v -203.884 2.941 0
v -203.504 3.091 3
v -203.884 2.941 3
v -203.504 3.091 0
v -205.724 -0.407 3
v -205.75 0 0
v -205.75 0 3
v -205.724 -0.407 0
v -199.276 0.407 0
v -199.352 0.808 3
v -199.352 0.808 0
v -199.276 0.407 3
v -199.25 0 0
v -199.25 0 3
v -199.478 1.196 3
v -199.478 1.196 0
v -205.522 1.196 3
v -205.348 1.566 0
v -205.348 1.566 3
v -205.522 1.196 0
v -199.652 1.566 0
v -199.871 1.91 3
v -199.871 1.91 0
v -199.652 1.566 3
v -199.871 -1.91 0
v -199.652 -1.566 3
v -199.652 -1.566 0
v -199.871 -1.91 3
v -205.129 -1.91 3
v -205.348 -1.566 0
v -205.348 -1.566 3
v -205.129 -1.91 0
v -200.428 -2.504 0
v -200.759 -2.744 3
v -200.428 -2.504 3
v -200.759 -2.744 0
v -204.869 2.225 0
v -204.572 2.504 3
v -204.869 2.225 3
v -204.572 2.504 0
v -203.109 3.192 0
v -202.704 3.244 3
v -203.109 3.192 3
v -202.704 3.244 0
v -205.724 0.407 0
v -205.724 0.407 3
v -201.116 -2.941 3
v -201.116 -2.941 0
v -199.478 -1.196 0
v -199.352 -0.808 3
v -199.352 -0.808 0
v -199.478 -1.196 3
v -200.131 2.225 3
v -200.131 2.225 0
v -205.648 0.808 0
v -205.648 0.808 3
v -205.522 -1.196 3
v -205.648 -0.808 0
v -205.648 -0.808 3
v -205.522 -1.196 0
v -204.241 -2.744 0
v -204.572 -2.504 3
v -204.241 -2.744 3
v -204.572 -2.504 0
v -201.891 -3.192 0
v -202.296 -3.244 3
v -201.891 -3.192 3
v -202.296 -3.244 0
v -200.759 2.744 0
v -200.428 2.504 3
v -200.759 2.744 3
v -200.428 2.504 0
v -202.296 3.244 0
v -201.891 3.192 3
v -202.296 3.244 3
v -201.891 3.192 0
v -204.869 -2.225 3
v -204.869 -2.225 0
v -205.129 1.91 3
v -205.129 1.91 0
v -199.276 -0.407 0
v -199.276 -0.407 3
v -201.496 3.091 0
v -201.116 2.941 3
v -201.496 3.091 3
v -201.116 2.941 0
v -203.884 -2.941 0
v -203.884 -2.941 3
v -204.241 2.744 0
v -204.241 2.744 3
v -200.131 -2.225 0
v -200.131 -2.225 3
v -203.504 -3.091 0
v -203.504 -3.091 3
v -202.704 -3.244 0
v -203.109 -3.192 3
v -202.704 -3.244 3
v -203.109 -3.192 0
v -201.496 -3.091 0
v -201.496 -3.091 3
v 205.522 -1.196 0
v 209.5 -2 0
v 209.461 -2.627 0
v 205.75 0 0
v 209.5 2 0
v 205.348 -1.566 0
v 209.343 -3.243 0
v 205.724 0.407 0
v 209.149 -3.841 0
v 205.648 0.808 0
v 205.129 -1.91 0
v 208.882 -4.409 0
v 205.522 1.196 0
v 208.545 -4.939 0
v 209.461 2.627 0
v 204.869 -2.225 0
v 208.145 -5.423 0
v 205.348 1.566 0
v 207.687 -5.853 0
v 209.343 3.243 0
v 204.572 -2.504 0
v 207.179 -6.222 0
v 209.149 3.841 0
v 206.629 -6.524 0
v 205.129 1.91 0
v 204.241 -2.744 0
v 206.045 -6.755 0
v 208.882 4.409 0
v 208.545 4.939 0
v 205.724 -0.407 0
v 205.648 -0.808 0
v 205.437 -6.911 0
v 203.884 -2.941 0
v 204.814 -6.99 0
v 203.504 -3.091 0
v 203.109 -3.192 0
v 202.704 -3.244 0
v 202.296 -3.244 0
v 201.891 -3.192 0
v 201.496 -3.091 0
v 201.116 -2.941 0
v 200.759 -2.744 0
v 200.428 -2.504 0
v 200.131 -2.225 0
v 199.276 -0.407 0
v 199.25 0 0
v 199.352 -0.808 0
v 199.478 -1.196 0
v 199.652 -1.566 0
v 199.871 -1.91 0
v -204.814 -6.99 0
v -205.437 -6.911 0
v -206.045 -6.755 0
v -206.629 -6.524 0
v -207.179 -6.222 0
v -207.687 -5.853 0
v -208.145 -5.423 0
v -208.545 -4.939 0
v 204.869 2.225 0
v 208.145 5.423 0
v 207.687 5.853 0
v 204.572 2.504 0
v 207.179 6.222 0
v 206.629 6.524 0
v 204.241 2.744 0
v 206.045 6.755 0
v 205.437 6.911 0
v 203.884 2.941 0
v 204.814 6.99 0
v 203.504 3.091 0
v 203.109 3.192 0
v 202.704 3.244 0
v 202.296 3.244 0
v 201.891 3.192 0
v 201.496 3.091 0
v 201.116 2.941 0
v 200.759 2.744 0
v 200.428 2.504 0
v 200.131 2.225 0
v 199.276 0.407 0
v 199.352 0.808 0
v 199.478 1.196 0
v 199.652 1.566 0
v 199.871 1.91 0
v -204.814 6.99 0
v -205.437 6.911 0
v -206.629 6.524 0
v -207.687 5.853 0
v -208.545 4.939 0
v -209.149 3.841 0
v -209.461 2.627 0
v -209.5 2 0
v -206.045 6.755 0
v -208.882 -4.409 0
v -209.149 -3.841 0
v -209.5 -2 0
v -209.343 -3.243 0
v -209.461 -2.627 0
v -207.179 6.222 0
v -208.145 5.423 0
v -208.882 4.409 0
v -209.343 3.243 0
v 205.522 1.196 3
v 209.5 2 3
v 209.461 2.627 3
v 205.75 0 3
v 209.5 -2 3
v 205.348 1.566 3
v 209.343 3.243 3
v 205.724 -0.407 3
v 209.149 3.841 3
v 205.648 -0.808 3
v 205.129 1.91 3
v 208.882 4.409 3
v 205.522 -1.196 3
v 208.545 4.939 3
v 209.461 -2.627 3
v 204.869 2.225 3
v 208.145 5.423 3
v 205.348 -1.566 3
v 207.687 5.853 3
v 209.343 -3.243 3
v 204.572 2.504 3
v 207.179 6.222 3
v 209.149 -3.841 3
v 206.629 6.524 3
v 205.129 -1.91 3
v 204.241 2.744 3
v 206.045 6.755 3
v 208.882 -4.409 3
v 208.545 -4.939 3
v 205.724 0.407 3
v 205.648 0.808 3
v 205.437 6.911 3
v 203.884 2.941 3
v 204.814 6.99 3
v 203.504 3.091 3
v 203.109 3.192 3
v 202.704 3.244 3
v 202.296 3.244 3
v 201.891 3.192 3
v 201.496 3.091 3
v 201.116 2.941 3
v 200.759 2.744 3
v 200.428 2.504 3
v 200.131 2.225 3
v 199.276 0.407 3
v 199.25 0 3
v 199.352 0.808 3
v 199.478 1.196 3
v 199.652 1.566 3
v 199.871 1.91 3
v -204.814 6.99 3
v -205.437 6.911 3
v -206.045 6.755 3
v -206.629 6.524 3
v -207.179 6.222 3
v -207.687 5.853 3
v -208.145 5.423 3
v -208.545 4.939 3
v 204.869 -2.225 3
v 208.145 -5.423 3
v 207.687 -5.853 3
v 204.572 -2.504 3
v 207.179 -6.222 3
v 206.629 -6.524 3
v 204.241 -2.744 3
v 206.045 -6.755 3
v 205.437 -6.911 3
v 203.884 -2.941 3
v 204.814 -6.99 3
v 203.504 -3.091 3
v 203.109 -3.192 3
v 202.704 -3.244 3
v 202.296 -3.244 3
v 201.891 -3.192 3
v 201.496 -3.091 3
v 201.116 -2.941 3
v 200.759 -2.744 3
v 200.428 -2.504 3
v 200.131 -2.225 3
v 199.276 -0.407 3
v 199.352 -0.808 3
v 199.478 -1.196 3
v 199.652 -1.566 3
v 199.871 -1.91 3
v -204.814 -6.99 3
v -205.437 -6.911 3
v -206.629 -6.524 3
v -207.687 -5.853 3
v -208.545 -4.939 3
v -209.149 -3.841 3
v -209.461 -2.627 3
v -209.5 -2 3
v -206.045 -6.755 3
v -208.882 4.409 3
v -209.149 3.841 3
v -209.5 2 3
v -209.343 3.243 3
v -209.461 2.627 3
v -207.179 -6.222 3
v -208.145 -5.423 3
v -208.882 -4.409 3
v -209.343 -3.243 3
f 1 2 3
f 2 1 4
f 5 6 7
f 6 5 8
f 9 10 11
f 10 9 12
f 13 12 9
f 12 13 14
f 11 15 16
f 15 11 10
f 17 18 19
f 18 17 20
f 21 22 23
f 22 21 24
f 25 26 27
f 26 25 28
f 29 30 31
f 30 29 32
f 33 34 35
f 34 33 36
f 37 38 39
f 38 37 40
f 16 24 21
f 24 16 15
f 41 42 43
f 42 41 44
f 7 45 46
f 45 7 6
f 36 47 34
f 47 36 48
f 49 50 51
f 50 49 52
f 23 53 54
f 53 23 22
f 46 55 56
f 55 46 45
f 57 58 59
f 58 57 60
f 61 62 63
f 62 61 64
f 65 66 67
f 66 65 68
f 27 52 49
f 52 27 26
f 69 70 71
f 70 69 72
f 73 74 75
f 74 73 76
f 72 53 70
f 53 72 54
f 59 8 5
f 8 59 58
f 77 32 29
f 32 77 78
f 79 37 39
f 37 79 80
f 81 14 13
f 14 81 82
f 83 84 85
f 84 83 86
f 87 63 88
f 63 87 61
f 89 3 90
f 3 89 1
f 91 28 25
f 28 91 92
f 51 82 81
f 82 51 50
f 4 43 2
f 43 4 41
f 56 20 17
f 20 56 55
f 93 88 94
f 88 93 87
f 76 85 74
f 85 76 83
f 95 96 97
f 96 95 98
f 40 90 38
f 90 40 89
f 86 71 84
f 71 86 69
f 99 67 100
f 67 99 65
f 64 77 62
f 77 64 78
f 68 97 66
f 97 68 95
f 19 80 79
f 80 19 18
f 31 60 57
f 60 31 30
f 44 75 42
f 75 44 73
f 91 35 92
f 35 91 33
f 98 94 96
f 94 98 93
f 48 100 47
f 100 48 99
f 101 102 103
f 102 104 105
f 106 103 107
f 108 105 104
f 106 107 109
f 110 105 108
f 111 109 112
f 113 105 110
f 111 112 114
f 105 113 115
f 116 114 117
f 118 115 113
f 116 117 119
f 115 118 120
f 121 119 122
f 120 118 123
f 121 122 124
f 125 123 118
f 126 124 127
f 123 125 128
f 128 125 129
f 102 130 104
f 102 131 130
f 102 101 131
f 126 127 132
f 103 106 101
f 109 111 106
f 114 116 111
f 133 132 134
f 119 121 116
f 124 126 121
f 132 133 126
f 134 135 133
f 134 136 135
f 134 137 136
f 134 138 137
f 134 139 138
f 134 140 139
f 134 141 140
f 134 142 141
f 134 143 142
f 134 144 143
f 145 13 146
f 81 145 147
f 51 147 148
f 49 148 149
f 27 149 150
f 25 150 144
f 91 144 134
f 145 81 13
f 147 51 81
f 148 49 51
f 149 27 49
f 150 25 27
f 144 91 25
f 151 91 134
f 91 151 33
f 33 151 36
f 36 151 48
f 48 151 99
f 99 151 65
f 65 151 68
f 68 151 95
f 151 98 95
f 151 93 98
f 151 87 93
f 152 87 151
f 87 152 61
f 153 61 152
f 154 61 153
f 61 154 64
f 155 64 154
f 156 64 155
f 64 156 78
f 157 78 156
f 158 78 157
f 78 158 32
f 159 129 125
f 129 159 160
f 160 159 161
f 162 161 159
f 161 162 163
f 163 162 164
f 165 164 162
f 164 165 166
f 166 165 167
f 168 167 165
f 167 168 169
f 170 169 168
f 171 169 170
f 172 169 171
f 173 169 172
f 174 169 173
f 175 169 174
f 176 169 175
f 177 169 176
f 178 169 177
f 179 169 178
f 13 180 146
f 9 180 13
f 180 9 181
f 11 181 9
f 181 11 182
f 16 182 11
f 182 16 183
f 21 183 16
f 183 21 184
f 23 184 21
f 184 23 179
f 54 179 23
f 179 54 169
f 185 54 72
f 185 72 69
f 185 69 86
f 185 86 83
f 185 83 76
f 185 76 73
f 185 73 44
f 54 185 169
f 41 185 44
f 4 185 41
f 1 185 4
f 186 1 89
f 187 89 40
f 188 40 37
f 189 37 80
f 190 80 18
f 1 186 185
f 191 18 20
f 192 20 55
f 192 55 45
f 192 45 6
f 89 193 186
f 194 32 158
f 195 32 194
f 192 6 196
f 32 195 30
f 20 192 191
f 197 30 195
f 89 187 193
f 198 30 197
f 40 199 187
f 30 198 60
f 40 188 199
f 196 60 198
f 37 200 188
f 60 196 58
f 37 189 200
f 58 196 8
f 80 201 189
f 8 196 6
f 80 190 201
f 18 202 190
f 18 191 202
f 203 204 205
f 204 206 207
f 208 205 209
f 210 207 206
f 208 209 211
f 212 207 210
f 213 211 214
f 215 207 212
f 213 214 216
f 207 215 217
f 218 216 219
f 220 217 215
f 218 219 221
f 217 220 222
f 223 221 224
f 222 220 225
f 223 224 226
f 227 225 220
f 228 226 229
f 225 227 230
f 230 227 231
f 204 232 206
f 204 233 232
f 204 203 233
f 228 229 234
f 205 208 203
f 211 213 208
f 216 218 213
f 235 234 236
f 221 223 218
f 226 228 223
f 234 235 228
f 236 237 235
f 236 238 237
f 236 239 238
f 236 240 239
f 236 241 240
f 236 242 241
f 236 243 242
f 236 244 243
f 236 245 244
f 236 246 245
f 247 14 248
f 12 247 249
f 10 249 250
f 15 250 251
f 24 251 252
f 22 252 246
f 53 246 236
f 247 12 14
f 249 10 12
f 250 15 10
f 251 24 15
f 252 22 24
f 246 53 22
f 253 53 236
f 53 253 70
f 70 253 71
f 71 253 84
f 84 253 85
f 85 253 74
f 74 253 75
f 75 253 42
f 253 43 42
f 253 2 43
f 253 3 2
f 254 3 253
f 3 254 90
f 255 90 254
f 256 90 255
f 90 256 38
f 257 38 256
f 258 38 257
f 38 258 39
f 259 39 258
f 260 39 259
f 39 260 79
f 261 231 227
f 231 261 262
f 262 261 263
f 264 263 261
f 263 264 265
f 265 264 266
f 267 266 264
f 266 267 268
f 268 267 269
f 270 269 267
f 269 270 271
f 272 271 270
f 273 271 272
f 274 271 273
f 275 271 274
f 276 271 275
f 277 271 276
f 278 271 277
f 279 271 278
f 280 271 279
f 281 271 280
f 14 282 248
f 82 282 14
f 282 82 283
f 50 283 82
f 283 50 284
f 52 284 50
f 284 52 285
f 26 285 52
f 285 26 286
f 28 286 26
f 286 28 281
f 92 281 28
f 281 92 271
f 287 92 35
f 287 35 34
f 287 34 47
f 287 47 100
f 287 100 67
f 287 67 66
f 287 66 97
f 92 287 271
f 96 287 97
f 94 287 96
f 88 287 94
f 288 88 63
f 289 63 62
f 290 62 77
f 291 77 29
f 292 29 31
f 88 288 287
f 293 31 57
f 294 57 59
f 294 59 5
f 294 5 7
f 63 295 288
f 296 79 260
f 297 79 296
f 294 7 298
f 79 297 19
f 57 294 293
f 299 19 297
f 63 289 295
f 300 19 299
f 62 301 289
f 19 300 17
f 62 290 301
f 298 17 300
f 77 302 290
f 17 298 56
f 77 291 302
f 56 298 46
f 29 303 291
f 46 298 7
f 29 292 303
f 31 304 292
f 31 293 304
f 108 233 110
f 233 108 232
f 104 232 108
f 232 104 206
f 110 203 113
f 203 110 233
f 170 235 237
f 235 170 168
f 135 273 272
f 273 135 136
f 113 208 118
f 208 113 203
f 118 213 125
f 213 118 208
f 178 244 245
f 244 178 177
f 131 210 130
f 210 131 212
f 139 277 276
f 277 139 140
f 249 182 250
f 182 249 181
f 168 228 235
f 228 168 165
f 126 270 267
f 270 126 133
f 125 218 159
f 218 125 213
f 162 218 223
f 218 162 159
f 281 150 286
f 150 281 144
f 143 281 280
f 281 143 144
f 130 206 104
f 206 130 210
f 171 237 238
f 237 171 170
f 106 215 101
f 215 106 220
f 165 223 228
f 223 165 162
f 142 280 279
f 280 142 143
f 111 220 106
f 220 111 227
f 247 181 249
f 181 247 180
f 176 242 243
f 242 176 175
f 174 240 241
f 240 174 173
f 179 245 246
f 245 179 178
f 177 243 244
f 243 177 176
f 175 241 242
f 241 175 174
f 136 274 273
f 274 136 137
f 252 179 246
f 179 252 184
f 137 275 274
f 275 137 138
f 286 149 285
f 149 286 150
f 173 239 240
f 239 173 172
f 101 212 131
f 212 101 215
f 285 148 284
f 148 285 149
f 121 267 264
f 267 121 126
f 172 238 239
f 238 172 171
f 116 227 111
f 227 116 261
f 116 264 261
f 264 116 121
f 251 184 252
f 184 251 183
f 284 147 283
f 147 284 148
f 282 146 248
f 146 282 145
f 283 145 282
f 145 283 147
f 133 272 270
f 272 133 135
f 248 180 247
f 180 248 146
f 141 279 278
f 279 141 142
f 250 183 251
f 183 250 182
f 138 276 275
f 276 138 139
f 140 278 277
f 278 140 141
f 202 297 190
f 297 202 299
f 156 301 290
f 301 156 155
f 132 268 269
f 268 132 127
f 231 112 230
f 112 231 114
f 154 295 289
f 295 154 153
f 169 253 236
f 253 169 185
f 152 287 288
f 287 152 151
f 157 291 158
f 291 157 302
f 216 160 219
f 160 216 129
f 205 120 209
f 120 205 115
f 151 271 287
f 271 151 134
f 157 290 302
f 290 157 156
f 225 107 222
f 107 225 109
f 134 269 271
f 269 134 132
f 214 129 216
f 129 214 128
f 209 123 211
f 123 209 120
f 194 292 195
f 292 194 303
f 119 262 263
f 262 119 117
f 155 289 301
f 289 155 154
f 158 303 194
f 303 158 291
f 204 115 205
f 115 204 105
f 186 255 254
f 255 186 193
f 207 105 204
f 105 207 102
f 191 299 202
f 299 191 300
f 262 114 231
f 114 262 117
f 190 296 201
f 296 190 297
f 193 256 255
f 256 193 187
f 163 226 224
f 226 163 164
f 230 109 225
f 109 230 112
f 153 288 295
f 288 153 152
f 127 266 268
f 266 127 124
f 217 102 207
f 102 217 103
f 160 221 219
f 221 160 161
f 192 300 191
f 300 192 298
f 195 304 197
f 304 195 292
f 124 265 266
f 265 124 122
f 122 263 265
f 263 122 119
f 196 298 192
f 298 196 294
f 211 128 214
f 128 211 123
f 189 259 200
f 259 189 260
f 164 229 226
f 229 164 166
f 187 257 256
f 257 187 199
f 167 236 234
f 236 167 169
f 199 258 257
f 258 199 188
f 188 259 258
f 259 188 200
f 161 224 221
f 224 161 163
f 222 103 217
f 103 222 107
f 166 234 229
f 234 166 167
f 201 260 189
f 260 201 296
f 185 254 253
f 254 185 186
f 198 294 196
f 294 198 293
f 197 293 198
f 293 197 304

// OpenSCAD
$fn = 50;


difference() {
	union() {
		hull() {
			translate(v = [-204.5000000000, 2.0000000000, 0]) {
				cylinder(h = 3, r = 5);
			}
			translate(v = [204.5000000000, 2.0000000000, 0]) {
				cylinder(h = 3, r = 5);
			}
			translate(v = [-204.5000000000, -2.0000000000, 0]) {
				cylinder(h = 3, r = 5);
			}
			translate(v = [204.5000000000, -2.0000000000, 0]) {
				cylinder(h = 3, r = 5);
			}
		}
	}
	union() {
		translate(v = [-202.5000000000, 0.0000000000, 0]) {
			cylinder(h = 3, r = 3.2500000000);
		}
		translate(v = [202.5000000000, 0.0000000000, 0]) {
			cylinder(h = 3, r = 3.2500000000);
		}
		translate(v = [-202.5000000000, 0.0000000000, 0]) {
			cylinder(h = 3, r = 1.8000000000);
		}
		translate(v = [202.5000000000, 0.0000000000, 0]) {
			cylinder(h = 3, r = 1.8000000000);
		}
		translate(v = [-202.5000000000, 0.0000000000, 0]) {
			cylinder(h = 3, r = 1.8000000000);
		}
		translate(v = [202.5000000000, 0.0000000000, 0]) {
			cylinder(h = 3, r = 1.8000000000);
		}
		translate(v = [-202.5000000000, 0.0000000000, 0]) {
			cylinder(h = 3, r = 1.8000000000);
		}
		translate(v = [202.5000000000, 0.0000000000, 0]) {
			cylinder(h = 3, r = 1.8000000000);
		}
	}
}
